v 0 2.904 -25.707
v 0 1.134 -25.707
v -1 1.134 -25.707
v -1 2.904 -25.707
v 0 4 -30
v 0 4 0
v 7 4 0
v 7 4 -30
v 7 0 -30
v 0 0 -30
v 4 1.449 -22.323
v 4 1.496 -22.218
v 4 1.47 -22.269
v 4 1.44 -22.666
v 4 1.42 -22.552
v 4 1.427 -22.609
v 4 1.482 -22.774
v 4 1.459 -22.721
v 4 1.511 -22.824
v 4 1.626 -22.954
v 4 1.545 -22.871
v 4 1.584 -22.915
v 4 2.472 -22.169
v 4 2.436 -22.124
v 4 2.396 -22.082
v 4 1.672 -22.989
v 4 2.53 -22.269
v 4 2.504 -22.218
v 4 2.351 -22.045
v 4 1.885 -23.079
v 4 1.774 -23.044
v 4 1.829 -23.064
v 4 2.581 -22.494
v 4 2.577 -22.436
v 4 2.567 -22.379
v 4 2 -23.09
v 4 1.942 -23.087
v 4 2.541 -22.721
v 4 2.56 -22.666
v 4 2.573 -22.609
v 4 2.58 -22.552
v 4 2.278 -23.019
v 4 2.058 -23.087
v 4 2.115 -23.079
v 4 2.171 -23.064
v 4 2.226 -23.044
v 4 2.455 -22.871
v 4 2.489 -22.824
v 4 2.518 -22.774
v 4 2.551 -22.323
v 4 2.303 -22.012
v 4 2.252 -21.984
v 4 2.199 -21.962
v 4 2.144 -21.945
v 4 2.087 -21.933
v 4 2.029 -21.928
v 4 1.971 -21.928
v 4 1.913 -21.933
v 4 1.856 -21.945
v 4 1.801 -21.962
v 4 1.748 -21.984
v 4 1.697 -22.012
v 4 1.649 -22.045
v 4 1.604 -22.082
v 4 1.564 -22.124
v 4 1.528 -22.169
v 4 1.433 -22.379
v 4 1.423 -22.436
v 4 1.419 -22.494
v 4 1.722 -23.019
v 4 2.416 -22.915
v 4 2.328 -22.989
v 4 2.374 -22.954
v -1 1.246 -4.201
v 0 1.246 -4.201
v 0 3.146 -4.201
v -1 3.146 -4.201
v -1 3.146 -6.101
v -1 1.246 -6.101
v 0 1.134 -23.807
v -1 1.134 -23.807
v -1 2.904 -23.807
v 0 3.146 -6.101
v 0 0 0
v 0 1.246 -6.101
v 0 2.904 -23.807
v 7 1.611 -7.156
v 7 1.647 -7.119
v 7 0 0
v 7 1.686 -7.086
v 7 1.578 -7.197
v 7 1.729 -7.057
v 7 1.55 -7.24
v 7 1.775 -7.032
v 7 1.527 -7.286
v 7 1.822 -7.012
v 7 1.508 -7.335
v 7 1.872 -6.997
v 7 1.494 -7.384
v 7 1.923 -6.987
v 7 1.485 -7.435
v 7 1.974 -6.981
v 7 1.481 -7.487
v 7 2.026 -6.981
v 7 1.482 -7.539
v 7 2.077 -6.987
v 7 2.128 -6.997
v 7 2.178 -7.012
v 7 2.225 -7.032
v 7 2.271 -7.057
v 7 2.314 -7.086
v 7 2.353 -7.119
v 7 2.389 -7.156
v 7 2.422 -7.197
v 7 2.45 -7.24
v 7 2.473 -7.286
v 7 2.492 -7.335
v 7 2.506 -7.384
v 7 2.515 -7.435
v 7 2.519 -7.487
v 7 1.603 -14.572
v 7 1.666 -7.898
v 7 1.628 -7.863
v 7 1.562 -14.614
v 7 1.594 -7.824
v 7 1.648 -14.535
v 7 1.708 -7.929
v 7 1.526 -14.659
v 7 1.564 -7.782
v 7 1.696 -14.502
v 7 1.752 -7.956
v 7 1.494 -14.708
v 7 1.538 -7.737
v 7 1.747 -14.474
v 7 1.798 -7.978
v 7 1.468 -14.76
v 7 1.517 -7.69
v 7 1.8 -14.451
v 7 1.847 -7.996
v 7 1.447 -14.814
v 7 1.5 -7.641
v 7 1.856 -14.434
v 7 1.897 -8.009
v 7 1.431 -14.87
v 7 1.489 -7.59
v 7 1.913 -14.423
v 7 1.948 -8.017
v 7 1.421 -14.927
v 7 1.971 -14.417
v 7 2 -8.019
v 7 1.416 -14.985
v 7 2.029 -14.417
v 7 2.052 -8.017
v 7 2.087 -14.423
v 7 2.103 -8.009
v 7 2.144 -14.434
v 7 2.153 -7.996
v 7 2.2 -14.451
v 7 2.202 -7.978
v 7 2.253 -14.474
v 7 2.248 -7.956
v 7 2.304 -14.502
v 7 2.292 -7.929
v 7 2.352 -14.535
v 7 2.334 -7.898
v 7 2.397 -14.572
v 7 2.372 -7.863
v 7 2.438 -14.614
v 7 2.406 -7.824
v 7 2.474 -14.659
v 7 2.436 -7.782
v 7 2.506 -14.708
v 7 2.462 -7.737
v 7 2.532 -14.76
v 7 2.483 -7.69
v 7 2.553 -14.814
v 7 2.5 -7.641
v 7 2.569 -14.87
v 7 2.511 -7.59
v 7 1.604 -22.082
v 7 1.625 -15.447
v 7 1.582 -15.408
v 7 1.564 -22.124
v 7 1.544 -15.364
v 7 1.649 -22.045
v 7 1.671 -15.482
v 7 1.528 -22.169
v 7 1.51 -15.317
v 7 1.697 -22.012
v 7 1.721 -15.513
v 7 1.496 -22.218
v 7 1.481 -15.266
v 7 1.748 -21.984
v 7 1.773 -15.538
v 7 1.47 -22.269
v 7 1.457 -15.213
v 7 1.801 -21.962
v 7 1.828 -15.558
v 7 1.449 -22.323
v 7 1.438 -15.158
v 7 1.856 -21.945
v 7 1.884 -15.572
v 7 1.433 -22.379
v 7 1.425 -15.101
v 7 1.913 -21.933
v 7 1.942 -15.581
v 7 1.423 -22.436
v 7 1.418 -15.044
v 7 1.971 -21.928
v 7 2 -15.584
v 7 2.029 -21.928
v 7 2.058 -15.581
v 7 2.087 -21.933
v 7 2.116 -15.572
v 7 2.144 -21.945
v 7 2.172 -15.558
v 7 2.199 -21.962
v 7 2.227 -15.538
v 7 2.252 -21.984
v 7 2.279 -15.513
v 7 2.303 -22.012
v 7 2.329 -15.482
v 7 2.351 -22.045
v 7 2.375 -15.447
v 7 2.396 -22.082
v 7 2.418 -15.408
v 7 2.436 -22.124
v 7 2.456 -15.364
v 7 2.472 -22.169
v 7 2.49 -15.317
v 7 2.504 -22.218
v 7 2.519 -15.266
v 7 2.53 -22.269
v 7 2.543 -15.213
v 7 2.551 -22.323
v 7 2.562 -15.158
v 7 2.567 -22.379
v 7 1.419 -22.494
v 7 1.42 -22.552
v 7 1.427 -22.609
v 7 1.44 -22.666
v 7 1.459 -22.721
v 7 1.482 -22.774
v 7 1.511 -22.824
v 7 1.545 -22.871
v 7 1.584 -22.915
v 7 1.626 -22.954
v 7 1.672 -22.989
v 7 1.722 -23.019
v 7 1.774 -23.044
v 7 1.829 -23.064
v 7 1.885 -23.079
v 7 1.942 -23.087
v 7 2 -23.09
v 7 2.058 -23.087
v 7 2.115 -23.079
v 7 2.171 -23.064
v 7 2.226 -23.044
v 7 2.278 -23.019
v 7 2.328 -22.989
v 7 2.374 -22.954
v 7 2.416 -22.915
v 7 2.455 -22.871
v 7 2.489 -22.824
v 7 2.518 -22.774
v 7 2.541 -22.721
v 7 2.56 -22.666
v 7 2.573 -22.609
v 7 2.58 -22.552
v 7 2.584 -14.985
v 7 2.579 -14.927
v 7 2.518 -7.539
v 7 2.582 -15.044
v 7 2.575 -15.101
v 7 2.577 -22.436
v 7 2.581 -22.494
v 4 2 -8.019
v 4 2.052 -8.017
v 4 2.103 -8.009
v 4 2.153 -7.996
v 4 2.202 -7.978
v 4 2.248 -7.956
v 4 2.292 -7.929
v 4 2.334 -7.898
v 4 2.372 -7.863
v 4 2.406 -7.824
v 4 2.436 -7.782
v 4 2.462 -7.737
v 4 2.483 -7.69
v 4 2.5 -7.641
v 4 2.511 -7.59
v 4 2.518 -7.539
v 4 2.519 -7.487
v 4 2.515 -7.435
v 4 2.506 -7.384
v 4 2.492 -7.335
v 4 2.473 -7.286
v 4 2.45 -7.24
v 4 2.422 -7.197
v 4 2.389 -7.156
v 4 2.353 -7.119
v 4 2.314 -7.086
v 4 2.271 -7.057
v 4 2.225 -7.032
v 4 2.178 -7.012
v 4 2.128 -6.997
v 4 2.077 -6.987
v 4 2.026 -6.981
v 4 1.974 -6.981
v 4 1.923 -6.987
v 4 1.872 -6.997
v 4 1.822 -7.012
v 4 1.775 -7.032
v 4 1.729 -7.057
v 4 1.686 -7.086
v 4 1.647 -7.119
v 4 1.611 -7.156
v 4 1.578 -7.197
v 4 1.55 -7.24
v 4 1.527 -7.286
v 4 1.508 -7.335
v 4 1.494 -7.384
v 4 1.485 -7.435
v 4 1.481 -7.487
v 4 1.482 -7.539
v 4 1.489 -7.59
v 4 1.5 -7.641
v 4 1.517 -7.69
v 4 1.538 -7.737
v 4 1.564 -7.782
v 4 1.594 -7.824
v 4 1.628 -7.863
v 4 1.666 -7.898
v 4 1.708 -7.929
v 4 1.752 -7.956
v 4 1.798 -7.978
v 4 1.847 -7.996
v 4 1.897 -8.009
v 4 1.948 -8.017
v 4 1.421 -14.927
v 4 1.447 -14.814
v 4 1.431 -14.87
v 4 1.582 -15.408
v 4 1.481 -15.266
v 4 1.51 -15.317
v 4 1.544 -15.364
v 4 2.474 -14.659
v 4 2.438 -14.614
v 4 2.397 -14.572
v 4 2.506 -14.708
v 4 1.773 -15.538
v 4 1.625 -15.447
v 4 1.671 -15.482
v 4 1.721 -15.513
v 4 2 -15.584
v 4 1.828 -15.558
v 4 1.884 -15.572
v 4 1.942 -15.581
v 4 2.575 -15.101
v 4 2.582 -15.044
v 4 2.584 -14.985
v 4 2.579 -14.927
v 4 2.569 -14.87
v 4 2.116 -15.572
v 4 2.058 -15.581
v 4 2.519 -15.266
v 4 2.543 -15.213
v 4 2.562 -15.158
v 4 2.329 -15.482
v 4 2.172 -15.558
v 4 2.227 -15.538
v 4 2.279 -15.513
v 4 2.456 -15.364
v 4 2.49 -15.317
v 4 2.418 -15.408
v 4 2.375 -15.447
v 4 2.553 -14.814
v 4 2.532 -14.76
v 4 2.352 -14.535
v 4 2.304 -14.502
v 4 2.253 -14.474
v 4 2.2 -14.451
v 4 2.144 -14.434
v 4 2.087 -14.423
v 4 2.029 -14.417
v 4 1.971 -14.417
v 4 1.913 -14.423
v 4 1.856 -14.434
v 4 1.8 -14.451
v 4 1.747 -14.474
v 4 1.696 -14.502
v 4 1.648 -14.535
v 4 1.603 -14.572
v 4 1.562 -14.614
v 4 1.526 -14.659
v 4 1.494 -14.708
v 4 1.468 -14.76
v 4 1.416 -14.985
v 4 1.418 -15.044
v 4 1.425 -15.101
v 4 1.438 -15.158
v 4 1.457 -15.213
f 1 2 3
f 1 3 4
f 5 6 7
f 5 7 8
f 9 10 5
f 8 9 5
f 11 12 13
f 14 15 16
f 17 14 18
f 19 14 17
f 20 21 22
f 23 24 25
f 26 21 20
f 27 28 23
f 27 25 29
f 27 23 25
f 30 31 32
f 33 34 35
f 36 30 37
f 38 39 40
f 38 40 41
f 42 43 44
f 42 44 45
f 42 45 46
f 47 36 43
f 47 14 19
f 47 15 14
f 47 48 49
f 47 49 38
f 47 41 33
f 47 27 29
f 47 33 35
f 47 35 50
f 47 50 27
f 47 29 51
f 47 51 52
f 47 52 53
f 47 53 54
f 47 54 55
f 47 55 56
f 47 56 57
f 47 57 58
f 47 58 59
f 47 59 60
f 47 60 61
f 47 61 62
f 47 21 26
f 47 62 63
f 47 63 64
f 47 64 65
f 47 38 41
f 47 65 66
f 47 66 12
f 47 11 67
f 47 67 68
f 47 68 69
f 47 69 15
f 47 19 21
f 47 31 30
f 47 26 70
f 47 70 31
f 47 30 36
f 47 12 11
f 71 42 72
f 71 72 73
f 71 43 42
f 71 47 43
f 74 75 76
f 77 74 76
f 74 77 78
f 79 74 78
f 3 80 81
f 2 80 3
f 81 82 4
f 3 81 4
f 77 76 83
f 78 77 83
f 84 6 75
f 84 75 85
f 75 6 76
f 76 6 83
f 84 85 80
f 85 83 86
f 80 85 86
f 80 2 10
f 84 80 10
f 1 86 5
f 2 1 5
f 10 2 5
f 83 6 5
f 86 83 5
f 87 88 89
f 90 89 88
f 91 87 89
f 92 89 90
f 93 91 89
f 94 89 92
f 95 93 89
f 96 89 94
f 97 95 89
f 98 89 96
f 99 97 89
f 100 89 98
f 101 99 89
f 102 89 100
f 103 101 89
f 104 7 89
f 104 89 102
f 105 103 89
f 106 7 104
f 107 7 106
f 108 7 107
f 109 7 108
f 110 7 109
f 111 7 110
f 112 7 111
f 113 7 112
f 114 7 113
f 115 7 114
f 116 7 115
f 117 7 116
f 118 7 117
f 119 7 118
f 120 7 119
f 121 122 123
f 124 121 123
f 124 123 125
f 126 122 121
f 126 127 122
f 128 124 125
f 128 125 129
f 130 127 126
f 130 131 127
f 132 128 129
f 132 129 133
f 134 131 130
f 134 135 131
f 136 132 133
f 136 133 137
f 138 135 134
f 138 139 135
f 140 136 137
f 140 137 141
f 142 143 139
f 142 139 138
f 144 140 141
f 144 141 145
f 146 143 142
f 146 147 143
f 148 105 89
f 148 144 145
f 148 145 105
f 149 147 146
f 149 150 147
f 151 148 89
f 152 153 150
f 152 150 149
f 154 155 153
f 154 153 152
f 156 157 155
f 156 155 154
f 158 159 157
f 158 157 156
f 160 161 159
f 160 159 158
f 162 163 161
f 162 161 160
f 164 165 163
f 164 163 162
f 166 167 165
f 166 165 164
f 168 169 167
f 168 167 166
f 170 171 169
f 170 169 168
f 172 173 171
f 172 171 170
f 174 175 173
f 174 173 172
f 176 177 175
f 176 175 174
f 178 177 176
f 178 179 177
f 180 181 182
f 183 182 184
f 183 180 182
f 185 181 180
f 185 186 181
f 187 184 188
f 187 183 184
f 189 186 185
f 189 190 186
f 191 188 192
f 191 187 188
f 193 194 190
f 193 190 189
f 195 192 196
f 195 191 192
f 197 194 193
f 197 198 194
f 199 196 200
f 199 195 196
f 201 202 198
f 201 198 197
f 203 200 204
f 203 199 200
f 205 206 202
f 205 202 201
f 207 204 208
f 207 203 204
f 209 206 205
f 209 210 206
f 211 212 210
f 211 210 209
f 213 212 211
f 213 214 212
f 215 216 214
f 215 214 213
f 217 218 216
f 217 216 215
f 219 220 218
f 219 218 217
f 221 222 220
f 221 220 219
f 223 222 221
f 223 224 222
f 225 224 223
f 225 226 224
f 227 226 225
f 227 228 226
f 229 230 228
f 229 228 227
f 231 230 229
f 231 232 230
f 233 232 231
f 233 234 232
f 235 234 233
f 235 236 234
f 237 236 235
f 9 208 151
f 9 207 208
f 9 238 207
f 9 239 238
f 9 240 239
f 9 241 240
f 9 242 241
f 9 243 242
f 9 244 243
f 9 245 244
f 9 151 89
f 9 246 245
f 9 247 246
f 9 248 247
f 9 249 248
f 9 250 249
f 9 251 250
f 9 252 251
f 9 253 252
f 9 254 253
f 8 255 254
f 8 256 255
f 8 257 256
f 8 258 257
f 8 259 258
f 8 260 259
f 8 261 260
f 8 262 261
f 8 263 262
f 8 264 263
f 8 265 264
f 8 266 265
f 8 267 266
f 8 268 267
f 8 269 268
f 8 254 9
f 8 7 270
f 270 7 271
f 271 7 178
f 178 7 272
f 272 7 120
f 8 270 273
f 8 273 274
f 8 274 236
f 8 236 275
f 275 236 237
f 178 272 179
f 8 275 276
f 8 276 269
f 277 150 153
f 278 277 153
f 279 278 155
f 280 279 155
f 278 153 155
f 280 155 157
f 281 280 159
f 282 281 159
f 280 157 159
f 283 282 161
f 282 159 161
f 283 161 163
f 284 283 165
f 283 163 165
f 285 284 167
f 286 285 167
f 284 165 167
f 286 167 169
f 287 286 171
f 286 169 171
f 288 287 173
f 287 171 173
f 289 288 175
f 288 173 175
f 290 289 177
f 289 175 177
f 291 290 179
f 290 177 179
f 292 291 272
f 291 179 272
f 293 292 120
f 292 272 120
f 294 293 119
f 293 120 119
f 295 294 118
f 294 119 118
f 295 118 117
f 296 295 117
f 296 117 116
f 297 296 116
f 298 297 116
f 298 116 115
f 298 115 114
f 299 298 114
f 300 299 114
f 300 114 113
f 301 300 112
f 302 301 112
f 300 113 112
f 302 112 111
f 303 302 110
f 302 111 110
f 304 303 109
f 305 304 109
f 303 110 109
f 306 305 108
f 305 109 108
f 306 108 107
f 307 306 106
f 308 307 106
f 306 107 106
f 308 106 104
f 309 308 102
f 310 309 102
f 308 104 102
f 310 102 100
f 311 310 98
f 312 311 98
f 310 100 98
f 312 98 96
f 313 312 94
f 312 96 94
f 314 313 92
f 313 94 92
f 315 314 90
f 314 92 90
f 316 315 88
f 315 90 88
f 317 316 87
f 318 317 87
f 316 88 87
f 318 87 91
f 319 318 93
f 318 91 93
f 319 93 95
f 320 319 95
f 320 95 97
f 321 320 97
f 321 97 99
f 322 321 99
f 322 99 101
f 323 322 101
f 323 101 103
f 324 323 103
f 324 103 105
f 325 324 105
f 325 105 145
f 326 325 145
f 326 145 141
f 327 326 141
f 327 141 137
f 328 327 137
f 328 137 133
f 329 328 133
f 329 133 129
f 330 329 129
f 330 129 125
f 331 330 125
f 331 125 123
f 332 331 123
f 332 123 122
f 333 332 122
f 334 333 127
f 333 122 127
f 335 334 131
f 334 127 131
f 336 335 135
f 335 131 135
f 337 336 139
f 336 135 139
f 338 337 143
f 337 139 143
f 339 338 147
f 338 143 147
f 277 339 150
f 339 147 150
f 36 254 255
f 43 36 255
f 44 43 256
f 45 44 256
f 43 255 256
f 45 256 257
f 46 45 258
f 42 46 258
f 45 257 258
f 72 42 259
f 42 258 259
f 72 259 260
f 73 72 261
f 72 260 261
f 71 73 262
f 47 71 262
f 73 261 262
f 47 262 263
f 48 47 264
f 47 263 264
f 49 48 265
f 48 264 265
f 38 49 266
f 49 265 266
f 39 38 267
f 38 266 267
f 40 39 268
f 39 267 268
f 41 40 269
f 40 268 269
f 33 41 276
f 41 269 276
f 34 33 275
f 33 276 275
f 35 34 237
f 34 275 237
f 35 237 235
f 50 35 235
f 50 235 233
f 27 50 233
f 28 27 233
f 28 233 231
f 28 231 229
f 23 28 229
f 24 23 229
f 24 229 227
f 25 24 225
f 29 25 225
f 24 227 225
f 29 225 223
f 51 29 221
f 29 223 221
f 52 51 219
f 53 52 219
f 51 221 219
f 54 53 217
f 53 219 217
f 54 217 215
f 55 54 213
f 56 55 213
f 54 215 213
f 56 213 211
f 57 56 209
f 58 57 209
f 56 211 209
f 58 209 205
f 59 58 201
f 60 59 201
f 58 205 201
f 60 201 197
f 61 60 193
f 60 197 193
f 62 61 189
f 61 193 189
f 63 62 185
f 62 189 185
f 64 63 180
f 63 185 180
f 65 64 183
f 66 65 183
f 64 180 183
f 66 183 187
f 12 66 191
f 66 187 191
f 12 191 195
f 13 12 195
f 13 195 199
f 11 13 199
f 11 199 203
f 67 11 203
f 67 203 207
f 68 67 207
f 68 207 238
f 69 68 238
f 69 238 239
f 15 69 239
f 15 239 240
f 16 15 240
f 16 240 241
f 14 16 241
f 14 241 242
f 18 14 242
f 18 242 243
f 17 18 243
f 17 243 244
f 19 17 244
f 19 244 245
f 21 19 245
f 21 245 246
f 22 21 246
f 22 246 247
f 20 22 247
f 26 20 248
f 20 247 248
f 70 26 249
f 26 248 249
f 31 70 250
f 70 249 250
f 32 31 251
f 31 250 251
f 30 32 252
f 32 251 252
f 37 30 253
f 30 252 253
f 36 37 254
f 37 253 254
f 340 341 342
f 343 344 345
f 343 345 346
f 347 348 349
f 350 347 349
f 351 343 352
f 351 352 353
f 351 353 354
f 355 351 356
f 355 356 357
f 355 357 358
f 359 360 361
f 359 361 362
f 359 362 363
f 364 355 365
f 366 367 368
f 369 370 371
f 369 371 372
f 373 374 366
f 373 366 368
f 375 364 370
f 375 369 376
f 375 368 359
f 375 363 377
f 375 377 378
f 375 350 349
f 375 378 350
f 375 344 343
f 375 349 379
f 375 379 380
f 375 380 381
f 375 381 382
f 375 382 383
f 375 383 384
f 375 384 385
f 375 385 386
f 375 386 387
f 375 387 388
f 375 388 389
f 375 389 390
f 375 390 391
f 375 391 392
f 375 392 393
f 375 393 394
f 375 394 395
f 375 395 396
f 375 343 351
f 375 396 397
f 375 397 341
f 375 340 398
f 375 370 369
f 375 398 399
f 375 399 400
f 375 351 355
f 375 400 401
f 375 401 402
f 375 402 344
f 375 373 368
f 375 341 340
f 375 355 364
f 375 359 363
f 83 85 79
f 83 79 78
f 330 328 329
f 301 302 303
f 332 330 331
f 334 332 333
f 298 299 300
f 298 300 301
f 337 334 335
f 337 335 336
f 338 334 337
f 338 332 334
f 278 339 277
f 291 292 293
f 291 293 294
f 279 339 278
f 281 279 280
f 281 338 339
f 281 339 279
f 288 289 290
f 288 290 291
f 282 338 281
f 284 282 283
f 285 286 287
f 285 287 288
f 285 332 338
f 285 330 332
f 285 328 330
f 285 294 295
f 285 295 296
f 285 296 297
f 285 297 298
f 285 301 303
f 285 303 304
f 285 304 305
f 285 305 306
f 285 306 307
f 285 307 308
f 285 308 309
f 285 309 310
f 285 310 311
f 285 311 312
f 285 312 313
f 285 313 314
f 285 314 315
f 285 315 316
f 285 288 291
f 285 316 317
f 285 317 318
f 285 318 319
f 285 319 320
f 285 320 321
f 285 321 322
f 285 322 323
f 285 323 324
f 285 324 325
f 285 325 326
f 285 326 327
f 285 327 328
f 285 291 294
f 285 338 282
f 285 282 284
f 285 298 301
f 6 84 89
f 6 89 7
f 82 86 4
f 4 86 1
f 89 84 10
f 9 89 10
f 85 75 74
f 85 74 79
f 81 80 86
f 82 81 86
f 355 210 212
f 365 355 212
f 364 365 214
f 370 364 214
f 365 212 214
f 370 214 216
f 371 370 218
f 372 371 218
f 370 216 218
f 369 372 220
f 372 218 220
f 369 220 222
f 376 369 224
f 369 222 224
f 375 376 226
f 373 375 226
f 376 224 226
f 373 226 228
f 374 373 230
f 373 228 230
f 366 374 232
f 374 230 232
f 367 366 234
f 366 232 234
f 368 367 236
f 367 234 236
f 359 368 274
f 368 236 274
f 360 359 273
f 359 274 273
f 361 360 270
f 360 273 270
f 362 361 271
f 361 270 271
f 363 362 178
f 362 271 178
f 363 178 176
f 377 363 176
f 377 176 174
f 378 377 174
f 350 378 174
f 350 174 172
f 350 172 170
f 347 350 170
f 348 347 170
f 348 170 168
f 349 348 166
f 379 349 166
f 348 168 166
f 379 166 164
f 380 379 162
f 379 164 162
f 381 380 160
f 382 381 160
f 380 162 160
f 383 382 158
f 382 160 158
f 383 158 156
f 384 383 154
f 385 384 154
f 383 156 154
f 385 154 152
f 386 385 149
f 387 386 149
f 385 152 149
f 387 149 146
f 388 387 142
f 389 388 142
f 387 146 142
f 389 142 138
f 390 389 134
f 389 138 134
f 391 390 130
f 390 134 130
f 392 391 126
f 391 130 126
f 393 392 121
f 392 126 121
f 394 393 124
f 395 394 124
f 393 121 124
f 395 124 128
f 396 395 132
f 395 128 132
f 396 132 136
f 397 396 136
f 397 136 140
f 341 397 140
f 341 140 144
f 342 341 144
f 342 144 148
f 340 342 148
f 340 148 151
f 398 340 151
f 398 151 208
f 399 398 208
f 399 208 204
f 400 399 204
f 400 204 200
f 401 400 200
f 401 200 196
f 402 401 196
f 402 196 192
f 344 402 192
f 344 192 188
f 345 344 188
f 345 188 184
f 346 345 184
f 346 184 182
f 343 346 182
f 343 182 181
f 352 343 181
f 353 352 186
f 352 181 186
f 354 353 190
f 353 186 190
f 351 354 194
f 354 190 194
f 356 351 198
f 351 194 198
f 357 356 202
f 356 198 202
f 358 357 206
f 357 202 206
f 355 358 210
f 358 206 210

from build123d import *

# Parameters (mm, degrees)
SKETCH1_W                = 30
SKETCH1_H                = 4
BOSS_EXTRUDE1_DEPTH      = 7
SKETCH2_W                = 1.9
SKETCH2_H                = 1.9
BOSS_EXTRUDE2_DEPTH      = 1
SKETCH3_W                = 1.9
SKETCH3_H                = 1.769397694
BOSS_EXTRUDE3_DEPTH      = 1
BOSS_EXTRUDE3_DEPTH_BACK = 1
SKETCH4_R                = 0.519223145
SKETCH4_R_2              = 0.583770961
SKETCH4_R_3              = 0.581603631
CUT_EXTRUDE2_DEPTH       = 1
CUT_EXTRUDE2_DEPTH_BACK  = 3


with BuildPart() as part:
    # Sketch1 → Boss-Extrude1 (new body)
    with BuildSketch(Plane(origin=(0, 0, 0), x_dir=(0, 0, -1), z_dir=(1, 0, 0))):
        with Locations((15, 2)):
            Rectangle(SKETCH1_W, SKETCH1_H)
    extrude(amount=BOSS_EXTRUDE1_DEPTH)

    # Sketch2 → Boss-Extrude2 (add)
    with BuildSketch(Plane(origin=(0, 0, 0), x_dir=(0, 0, -1), z_dir=(1, 0, 0))):
        with Locations((5.150612861, 2.196174594)):
            Rectangle(SKETCH2_W, SKETCH2_H)
    extrude(amount=-BOSS_EXTRUDE2_DEPTH)

    # Sketch3 → Boss-Extrude3 (add, two sides)
    with BuildSketch(Plane(origin=(0, 0, 0), x_dir=(0, 0, -1), z_dir=(1, 0, 0))) as boss_extrude3_sk:
        with Locations((24.756915523, 2.019063583)):
            Rectangle(SKETCH3_W, SKETCH3_H)
    extrude(amount=BOSS_EXTRUDE3_DEPTH)
    extrude(boss_extrude3_sk.sketch, amount=-BOSS_EXTRUDE3_DEPTH_BACK)

    # Sketch4 → Cut-Extrude2 (cut, two sides)
    with BuildSketch(Plane(origin=(7, 0, 0), x_dir=(0, 0, -1), z_dir=(1, 0, 0))) as cut_extrude2_sk:
        with Locations((7.5, 2)):
            Circle(SKETCH4_R)
        with Locations((15, 2)):
            Circle(SKETCH4_R_2)
        with Locations((22.508486169, 2)):
            Circle(SKETCH4_R_3)
    extrude(amount=CUT_EXTRUDE2_DEPTH, mode=Mode.SUBTRACT)
    extrude(cut_extrude2_sk.sketch, amount=-CUT_EXTRUDE2_DEPTH_BACK, mode=Mode.SUBTRACT)


solid = part.part
